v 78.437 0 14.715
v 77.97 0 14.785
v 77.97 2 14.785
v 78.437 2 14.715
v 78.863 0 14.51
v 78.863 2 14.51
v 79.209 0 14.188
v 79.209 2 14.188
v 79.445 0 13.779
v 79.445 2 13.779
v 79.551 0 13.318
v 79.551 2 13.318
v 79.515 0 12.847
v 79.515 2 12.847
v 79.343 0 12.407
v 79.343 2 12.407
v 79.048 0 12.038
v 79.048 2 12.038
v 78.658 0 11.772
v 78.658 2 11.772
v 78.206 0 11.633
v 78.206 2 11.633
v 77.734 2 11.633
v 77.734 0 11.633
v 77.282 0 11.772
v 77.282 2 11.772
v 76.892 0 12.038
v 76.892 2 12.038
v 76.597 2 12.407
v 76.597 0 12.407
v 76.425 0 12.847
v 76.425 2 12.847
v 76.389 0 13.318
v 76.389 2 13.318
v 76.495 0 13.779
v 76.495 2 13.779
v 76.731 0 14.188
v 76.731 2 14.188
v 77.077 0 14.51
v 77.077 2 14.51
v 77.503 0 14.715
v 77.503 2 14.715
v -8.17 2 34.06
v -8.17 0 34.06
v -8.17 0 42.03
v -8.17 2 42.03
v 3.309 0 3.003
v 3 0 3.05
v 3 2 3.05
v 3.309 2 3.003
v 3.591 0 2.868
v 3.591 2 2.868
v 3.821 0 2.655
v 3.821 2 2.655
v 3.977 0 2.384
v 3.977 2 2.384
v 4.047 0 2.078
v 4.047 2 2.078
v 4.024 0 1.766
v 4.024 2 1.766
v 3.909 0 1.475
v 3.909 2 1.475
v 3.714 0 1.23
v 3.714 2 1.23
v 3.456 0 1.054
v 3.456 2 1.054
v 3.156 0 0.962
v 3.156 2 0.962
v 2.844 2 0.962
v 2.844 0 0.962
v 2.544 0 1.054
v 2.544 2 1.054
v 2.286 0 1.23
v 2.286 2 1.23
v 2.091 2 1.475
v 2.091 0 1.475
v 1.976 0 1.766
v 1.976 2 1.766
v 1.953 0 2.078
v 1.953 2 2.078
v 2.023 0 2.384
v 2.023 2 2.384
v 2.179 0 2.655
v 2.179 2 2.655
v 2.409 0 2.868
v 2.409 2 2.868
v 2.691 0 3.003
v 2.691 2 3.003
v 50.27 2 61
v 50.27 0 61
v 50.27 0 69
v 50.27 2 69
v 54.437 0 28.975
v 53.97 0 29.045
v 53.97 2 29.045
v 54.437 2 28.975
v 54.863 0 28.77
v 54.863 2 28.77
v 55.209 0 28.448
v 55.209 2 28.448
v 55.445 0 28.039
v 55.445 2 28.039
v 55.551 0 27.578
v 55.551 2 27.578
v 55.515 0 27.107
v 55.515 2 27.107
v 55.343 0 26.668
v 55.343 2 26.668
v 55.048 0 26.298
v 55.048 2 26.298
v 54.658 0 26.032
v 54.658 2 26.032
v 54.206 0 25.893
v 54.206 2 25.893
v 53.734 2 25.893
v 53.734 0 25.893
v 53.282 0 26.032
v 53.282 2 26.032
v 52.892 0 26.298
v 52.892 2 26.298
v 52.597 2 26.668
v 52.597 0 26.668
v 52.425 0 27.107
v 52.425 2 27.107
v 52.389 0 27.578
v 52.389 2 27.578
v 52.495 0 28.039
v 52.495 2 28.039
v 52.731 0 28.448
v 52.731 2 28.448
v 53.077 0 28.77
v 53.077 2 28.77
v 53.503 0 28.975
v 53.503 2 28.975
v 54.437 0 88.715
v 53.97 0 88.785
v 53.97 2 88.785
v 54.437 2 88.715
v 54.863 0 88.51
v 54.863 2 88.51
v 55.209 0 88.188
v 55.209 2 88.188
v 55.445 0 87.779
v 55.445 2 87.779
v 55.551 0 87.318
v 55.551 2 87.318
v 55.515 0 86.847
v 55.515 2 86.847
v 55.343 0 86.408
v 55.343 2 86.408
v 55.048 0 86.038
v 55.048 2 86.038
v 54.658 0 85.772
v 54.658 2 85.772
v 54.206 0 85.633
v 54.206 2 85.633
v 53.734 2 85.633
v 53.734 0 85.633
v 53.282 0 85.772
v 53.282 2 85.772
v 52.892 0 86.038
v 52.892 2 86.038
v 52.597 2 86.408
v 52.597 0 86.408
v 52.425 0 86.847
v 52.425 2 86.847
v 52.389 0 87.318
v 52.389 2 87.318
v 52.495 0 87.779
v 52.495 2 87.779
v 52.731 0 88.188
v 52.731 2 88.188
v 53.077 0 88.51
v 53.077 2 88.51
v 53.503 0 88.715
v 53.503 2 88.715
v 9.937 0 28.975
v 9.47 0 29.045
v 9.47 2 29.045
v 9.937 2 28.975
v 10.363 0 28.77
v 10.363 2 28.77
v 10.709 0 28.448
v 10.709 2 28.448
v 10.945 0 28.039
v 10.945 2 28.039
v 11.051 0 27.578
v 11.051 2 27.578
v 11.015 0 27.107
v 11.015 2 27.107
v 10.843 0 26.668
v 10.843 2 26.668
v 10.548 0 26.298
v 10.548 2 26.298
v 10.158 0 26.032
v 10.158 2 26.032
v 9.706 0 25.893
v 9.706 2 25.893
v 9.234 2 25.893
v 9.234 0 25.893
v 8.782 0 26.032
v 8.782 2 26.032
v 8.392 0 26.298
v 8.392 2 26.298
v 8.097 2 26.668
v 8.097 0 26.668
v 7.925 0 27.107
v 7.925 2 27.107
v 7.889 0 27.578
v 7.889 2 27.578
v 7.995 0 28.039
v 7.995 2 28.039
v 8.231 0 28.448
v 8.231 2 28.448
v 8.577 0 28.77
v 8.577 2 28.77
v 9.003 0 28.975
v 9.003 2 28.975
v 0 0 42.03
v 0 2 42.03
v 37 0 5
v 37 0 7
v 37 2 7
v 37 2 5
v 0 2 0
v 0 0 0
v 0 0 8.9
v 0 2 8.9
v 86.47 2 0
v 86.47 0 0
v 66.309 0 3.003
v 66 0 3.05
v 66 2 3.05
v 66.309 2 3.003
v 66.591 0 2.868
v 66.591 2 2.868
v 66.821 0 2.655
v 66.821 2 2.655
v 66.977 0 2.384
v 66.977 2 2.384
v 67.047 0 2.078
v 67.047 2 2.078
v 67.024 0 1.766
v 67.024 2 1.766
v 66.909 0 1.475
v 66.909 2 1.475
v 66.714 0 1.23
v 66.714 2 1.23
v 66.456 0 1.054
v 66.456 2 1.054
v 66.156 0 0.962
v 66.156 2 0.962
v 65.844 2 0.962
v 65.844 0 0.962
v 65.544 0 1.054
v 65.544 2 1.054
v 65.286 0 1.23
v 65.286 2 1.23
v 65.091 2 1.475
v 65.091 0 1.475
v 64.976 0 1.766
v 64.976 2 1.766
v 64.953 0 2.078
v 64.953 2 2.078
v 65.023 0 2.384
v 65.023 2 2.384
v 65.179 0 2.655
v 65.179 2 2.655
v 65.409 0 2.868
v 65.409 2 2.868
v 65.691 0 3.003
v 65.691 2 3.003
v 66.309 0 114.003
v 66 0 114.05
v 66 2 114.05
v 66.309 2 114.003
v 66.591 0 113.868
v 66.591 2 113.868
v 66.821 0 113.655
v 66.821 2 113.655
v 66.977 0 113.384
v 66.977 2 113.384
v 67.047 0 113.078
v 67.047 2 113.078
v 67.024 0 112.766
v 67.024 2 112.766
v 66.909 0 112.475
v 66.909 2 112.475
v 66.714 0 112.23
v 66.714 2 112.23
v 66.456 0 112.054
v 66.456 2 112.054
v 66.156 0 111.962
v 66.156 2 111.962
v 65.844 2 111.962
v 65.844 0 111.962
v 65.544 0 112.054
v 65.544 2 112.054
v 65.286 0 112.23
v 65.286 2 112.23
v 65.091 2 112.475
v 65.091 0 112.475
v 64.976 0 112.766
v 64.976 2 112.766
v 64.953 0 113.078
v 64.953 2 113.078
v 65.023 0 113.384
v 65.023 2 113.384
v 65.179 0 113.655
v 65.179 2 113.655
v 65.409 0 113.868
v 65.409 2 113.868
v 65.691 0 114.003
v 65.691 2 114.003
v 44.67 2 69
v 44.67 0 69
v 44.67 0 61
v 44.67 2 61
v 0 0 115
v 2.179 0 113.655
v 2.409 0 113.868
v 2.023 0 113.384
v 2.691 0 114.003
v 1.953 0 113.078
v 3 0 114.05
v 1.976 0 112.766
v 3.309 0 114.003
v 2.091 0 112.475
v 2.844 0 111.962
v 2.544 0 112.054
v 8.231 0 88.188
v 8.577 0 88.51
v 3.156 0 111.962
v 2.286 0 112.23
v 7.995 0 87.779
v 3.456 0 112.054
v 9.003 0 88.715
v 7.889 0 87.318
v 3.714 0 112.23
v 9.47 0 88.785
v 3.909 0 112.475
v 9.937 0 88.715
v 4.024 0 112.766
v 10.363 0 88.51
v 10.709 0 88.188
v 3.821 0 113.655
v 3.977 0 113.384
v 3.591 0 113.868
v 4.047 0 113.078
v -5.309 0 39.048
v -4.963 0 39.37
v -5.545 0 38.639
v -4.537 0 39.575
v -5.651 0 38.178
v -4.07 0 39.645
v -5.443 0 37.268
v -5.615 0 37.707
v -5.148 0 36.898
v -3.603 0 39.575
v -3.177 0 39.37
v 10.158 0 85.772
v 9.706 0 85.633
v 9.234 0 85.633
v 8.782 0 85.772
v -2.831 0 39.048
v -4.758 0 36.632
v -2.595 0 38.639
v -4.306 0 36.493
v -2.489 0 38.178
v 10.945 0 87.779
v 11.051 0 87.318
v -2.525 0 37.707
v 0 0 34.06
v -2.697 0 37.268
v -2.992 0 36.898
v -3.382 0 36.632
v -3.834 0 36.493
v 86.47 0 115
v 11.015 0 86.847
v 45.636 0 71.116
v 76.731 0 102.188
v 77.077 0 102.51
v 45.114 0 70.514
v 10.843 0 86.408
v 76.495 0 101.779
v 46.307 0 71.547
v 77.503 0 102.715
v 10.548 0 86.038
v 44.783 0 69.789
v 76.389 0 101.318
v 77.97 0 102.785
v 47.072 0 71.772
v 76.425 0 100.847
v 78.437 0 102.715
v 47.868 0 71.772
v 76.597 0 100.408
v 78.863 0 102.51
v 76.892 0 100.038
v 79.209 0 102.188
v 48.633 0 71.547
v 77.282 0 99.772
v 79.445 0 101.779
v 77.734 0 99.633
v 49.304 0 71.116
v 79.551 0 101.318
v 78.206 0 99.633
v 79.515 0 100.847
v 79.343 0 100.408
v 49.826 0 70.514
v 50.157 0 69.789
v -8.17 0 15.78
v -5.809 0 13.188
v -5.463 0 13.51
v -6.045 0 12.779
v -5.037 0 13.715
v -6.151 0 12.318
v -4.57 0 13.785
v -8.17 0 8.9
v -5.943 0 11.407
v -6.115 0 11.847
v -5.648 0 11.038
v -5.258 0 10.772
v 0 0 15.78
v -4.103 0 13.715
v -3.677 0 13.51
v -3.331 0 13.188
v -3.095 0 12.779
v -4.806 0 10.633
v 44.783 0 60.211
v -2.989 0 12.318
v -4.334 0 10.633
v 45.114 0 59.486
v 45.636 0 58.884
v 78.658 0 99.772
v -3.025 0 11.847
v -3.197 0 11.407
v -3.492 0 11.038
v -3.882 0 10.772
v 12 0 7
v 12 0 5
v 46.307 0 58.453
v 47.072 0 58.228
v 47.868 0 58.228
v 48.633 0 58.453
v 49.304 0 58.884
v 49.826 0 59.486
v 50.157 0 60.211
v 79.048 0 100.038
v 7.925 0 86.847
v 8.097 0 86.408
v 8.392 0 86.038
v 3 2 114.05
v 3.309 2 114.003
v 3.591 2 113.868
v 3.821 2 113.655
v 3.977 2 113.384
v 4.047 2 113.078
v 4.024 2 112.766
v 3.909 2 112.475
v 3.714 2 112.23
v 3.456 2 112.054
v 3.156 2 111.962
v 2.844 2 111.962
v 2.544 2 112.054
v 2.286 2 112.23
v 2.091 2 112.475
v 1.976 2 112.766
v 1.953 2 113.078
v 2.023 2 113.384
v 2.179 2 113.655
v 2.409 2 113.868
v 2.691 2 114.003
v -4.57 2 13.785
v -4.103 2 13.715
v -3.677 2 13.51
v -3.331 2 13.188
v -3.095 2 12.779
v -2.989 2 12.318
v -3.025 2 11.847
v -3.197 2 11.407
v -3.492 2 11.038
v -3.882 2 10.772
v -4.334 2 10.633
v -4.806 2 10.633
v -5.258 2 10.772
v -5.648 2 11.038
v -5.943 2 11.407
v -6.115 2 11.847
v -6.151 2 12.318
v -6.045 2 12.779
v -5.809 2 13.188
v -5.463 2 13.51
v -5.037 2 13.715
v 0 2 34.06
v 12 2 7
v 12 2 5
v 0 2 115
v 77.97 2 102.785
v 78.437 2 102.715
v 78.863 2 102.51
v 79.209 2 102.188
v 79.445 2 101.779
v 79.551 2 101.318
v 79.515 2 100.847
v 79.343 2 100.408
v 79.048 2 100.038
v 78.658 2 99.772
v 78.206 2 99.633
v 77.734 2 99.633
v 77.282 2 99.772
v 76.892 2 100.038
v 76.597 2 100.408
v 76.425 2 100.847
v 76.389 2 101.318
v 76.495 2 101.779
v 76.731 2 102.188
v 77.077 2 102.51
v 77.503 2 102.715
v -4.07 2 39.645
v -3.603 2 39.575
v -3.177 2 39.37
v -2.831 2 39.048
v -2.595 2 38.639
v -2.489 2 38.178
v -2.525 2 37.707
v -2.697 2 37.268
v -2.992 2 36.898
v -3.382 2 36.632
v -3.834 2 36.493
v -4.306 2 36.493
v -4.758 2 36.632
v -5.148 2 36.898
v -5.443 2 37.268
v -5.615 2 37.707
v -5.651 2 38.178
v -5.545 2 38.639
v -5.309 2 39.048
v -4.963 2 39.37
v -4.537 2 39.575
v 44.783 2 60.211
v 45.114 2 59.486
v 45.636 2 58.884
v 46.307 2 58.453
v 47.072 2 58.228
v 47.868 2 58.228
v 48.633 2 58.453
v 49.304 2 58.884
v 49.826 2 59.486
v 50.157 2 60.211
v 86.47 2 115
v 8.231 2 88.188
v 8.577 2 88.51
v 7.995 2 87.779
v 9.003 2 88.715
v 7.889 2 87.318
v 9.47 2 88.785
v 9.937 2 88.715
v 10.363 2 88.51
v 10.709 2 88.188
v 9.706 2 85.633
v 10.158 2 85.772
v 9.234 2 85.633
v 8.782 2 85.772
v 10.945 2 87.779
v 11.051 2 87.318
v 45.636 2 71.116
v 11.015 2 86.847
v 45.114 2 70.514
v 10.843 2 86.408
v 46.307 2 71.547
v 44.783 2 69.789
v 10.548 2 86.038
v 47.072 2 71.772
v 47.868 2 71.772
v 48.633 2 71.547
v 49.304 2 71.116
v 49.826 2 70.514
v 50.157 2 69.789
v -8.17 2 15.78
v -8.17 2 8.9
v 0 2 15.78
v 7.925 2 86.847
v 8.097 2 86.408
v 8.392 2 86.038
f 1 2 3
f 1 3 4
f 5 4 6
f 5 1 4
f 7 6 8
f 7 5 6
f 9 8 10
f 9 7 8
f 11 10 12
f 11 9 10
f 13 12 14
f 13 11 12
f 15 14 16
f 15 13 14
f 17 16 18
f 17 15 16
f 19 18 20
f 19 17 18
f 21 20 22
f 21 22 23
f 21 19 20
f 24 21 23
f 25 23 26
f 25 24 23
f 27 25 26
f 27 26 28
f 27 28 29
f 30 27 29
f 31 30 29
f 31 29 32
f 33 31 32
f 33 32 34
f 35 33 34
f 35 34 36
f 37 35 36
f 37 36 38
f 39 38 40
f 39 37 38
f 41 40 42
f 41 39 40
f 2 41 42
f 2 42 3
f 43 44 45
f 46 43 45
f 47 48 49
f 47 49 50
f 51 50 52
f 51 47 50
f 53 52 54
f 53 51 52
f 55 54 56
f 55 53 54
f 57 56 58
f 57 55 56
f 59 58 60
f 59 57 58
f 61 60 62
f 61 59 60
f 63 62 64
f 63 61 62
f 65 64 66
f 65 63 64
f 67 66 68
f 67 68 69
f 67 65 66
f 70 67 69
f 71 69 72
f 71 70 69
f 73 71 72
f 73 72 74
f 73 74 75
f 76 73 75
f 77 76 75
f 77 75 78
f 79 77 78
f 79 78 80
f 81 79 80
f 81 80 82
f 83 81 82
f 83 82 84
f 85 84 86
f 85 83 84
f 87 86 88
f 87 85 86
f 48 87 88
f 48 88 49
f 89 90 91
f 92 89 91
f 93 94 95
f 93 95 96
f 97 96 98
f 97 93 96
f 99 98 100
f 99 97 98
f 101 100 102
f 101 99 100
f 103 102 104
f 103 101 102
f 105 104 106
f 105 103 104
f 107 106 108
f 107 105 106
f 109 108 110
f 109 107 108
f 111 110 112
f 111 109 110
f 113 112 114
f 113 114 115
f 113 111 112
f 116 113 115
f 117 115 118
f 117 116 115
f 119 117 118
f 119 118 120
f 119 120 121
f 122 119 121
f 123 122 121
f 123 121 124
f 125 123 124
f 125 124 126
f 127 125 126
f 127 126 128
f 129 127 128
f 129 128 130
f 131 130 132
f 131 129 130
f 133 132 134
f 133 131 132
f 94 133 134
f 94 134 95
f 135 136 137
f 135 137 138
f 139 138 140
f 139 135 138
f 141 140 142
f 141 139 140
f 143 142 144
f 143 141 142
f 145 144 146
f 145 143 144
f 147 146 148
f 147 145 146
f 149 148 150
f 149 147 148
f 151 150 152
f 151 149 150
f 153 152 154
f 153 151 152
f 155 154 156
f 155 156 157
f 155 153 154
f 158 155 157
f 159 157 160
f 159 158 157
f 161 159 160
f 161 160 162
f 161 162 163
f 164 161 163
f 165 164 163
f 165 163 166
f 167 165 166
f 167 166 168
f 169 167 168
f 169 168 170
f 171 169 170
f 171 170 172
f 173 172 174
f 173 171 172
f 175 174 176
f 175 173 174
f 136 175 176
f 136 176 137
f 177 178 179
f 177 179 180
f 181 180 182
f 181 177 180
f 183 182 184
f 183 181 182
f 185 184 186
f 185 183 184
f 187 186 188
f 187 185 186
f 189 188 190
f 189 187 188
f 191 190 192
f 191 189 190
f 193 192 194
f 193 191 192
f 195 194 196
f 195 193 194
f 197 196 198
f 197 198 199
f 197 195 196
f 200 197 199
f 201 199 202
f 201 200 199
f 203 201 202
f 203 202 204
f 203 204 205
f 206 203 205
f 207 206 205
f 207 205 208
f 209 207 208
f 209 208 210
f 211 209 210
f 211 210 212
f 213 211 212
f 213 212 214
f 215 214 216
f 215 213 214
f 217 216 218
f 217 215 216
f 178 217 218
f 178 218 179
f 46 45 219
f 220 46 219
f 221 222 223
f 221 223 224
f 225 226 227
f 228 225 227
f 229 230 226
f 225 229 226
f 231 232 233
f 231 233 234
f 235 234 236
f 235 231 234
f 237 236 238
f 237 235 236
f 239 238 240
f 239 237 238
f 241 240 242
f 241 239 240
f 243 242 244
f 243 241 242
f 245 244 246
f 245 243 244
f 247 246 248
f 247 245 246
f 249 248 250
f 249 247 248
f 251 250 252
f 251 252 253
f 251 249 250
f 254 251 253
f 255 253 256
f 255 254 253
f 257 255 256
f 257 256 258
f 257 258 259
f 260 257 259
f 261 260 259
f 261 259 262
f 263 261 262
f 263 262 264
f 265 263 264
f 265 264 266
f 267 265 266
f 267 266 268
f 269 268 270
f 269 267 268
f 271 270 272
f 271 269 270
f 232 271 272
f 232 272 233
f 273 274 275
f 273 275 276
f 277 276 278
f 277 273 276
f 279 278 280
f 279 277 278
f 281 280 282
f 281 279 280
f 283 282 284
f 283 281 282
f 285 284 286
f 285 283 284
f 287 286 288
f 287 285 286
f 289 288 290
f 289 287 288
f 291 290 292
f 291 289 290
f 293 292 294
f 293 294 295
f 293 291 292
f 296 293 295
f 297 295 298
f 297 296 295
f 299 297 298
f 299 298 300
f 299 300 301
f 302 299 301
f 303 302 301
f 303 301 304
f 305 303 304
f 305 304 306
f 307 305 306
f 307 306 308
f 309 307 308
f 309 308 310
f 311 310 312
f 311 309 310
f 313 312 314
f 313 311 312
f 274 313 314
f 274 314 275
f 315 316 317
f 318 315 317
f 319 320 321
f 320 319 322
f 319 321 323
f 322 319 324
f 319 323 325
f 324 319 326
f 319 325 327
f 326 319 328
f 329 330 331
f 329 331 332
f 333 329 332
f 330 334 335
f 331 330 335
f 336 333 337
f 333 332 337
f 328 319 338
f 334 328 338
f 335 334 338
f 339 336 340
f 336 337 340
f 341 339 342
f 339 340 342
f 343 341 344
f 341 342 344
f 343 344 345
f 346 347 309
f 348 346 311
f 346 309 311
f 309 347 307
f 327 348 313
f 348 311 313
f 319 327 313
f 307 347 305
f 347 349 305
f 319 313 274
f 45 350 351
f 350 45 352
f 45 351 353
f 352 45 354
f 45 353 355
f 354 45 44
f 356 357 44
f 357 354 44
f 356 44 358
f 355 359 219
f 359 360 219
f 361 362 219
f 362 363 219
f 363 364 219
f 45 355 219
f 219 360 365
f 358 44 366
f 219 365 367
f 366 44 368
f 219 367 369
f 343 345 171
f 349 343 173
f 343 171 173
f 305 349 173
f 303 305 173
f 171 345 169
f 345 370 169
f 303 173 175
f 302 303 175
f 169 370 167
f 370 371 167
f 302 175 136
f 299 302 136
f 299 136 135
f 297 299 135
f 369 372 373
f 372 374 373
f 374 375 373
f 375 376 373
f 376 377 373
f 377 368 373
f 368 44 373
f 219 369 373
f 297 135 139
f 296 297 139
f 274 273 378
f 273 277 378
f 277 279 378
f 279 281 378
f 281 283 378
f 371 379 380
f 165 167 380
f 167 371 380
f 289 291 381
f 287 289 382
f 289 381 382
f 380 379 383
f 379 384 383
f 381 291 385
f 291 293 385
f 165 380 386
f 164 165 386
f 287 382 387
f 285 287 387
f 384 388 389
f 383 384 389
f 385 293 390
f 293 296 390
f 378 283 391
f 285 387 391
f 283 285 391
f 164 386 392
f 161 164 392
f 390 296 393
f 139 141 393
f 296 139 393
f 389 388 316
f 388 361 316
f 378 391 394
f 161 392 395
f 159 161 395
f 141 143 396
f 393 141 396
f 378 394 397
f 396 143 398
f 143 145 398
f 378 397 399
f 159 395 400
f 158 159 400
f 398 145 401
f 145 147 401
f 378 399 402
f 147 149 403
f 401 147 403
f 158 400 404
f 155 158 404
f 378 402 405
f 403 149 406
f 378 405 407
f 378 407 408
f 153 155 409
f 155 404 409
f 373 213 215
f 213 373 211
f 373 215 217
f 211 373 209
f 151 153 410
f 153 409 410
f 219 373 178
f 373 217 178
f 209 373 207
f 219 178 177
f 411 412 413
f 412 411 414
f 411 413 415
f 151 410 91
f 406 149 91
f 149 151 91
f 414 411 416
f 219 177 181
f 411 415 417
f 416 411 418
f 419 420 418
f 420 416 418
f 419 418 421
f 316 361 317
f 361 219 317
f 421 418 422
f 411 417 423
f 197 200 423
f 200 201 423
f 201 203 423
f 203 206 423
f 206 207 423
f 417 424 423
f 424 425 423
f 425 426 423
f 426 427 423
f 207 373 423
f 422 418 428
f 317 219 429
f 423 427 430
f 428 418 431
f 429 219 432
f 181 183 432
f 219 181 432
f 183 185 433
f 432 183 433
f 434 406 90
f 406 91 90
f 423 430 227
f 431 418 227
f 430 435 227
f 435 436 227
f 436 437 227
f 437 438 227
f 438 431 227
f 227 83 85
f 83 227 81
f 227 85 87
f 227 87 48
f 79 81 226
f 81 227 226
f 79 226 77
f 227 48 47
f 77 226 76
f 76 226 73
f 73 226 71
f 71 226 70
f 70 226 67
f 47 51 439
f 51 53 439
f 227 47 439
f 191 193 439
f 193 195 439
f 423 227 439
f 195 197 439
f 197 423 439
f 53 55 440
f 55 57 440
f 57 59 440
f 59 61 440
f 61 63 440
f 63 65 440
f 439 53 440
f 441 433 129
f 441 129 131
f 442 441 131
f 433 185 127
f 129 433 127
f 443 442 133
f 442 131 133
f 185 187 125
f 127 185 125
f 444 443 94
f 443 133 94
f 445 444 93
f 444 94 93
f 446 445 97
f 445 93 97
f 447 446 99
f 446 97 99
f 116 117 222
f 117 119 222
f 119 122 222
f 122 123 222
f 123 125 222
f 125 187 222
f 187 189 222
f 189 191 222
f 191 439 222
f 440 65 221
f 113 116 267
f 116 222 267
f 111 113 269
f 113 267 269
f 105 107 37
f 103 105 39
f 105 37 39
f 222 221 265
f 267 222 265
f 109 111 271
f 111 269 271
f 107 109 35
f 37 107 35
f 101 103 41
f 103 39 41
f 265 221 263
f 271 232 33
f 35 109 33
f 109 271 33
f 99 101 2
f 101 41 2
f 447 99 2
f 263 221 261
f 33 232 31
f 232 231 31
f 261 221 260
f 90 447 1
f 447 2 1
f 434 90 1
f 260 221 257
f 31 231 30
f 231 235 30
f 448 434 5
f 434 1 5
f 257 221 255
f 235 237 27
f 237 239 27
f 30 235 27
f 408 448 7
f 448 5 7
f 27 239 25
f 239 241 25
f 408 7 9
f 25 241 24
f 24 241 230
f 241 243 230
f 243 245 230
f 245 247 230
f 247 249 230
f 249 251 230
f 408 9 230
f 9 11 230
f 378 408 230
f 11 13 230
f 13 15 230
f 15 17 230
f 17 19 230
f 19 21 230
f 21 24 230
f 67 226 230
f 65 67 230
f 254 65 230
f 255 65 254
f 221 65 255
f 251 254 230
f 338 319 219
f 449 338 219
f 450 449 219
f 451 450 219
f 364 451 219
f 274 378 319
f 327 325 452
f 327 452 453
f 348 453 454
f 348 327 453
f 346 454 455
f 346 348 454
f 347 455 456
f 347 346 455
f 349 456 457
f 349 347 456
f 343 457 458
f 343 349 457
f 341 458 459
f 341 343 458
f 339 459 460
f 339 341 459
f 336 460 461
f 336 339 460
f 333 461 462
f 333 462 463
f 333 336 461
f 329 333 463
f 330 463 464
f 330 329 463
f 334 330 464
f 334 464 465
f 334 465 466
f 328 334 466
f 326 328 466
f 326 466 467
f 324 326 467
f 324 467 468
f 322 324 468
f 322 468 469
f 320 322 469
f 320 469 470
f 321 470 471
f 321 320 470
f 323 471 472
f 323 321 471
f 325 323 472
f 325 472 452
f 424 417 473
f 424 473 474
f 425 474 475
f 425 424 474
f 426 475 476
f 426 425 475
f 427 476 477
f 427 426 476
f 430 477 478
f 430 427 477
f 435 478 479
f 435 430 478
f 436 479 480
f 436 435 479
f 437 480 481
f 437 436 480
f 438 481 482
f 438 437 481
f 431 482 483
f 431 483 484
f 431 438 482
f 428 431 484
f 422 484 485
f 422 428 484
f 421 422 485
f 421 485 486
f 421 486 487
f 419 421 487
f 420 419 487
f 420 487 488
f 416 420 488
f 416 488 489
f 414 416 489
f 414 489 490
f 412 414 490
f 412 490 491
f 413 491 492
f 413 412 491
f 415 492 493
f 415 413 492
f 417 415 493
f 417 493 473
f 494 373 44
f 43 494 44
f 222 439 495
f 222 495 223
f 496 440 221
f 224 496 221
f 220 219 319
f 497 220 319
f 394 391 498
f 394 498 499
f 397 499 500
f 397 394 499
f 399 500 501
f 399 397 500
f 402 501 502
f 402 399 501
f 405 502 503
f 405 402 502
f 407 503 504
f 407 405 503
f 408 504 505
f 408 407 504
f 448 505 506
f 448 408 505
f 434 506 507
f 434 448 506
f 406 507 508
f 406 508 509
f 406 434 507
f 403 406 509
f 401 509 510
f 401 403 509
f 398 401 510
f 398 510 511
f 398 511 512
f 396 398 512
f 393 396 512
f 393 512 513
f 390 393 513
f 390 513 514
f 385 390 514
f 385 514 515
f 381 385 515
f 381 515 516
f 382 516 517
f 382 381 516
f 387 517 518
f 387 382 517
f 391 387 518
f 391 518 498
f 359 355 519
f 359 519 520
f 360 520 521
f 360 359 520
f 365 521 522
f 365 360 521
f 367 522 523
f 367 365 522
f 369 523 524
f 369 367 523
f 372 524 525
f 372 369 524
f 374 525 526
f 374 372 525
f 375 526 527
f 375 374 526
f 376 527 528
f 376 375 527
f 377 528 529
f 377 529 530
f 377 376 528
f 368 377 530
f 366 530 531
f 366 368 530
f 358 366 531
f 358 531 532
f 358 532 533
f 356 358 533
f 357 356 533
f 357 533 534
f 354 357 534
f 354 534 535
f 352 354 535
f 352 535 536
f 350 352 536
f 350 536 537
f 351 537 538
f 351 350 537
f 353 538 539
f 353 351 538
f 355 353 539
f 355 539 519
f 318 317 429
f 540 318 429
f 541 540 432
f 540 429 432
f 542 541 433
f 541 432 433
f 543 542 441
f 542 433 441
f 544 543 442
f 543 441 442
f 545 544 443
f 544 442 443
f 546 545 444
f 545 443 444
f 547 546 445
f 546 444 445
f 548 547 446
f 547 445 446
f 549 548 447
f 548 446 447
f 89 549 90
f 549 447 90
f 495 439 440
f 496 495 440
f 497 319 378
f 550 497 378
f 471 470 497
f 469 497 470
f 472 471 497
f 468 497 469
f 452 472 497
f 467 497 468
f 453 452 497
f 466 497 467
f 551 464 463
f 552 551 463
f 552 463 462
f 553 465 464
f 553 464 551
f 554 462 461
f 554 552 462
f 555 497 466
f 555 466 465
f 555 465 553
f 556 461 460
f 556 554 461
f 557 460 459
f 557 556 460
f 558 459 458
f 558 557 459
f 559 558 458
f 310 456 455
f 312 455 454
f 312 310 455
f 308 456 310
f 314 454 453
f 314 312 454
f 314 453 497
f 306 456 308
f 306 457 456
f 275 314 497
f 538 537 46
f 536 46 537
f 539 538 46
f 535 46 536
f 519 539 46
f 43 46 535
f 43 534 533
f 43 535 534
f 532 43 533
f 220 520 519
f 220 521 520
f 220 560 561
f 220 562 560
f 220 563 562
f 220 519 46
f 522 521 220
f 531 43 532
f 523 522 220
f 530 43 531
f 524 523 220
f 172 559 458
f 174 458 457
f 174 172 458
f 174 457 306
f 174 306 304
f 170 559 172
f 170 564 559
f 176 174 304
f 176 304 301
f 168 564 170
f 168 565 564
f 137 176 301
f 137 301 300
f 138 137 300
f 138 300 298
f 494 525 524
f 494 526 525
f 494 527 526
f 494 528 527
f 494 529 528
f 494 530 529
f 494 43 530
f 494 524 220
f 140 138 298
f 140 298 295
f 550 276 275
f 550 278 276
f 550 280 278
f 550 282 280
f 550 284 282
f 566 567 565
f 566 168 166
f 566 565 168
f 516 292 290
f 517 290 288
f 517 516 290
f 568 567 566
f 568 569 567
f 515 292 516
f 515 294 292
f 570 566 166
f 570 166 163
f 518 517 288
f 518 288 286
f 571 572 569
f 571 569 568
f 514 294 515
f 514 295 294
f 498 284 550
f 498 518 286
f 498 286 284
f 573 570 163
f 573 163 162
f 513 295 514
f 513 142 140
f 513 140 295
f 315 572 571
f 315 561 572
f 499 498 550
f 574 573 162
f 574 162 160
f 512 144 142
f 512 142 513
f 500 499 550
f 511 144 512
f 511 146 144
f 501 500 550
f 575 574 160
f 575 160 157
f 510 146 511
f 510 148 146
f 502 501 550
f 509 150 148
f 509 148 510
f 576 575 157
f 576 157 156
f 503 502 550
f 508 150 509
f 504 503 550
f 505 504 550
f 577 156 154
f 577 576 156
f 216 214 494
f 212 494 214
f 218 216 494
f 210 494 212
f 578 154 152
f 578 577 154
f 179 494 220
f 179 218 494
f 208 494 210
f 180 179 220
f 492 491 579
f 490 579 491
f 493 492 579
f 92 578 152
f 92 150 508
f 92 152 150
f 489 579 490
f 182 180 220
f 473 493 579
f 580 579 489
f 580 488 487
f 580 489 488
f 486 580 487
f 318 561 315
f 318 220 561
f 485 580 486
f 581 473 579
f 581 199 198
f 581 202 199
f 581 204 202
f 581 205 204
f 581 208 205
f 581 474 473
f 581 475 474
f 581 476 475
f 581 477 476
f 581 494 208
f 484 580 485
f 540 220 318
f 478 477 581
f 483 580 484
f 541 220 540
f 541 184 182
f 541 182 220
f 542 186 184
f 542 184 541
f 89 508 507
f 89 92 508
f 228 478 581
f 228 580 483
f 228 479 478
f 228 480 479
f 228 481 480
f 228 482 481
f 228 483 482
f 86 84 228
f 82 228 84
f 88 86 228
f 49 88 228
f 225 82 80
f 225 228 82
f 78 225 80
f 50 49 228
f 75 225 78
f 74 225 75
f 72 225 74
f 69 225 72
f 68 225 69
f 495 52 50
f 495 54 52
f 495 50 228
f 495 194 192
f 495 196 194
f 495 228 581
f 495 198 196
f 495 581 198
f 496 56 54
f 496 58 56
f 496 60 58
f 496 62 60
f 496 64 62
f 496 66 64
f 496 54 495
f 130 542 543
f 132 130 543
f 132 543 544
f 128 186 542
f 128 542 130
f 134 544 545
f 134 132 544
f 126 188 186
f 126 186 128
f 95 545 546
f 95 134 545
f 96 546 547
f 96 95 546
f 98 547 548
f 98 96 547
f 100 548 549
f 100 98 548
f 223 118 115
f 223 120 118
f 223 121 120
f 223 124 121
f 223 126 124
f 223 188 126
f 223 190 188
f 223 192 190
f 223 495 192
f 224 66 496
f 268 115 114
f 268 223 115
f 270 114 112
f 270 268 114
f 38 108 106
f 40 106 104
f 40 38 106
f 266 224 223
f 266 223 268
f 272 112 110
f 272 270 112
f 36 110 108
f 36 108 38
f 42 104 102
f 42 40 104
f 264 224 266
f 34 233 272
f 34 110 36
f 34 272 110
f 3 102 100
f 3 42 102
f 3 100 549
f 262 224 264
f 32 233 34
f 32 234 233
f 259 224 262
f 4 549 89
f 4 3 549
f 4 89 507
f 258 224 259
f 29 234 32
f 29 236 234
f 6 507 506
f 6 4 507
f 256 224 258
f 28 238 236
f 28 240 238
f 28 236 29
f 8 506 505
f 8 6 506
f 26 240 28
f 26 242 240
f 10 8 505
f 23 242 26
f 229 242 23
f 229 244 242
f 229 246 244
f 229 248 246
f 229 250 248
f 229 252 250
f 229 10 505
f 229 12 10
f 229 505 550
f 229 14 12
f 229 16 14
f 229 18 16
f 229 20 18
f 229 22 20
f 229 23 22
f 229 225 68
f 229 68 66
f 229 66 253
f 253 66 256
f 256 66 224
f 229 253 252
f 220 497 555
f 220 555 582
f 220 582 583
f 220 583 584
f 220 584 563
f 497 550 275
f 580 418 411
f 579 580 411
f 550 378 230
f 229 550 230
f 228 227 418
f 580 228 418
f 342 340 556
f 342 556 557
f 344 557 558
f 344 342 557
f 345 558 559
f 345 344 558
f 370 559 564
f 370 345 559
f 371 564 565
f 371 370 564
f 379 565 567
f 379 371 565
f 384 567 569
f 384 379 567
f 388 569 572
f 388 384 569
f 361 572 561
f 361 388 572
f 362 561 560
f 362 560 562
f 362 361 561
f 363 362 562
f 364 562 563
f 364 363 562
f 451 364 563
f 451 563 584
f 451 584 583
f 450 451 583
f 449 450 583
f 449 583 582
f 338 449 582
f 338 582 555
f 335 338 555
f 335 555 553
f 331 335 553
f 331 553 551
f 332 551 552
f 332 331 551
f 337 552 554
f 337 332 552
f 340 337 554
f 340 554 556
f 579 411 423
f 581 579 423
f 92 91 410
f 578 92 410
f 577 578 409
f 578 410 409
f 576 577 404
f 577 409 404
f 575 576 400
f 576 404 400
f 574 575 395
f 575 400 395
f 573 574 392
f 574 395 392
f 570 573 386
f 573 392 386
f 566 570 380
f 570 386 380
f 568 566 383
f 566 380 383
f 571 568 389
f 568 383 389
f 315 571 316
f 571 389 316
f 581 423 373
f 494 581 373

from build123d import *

# Parameters (mm, degrees)
SKETCH_1_R      = 1.05
SKETCH_1_R_2    = 1.585
SKETCH_1_W      = 25
SKETCH_1_H      = 2
EXTRUDE_1_DEPTH = 2


with BuildPart() as part:
    # 草图1 → 凸台-拉伸1 (new body)
    with BuildSketch(Plane(origin=(0, 0, 0), x_dir=(1, 0, 0), z_dir=(0, 1, 0))):
        Polygon((86.47, 0), (0, 0), (0, -8.9), (-8.17, -8.9), (-8.17, -15.78), (0, -15.78), (0, -34.06), (-8.17, -34.06), (-8.17, -42.03), (0, -42.03), (0, -115), (86.47, -115), align=None)
        with Locations(Location((3, -113, 0), (0, 0, 270))):
            Circle(SKETCH_1_R, mode=Mode.SUBTRACT)
        with Locations(Location((9.47, -87.2, 0), (0, 0, 270))):
            Circle(SKETCH_1_R_2, mode=Mode.SUBTRACT)
        with Locations(Location((53.97, -87.2, 0), (0, 0, 270))):
            Circle(SKETCH_1_R_2, mode=Mode.SUBTRACT)
        with Locations(Location((66, -113, 0), (0, 0, 270))):
            Circle(SKETCH_1_R, mode=Mode.SUBTRACT)
        with Locations(Location((77.97, -101.2, 0), (0, 0, 270))):
            Circle(SKETCH_1_R_2, mode=Mode.SUBTRACT)
        with BuildLine():
            ThreePointArc((44.67, -61), (47.47, -58.2), (50.27, -61))
            Line((50.27, -61), (50.27, -69))
            ThreePointArc((50.27, -69), (47.47, -71.8), (44.67, -69))
            Line((44.67, -69), (44.67, -61))
        make_face(mode=Mode.SUBTRACT)
        with Locations(Location((9.47, -27.46, 0), (0, 0, 270))):
            Circle(SKETCH_1_R_2, mode=Mode.SUBTRACT)
        with Locations(Location((3, -2, 0), (0, 0, 270))):
            Circle(SKETCH_1_R, mode=Mode.SUBTRACT)
        with Locations((24.5, -6)):
            Rectangle(SKETCH_1_W, SKETCH_1_H, mode=Mode.SUBTRACT)
        with Locations(Location((53.97, -27.46, 0), (0, 0, 270))):
            Circle(SKETCH_1_R_2, mode=Mode.SUBTRACT)
        with Locations(Location((66, -2, 0), (0, 0, 270))):
            Circle(SKETCH_1_R, mode=Mode.SUBTRACT)
        with Locations(Location((77.97, -13.2, 0), (0, 0, 270))):
            Circle(SKETCH_1_R_2, mode=Mode.SUBTRACT)
        with Locations(Location((-4.57, -12.2, 0), (0, 0, 270))):
            Circle(SKETCH_1_R_2, mode=Mode.SUBTRACT)
        with Locations(Location((-4.07, -38.06, 0), (0, 0, 270))):
            Circle(SKETCH_1_R_2, mode=Mode.SUBTRACT)
    extrude(amount=EXTRUDE_1_DEPTH)


solid = part.part
